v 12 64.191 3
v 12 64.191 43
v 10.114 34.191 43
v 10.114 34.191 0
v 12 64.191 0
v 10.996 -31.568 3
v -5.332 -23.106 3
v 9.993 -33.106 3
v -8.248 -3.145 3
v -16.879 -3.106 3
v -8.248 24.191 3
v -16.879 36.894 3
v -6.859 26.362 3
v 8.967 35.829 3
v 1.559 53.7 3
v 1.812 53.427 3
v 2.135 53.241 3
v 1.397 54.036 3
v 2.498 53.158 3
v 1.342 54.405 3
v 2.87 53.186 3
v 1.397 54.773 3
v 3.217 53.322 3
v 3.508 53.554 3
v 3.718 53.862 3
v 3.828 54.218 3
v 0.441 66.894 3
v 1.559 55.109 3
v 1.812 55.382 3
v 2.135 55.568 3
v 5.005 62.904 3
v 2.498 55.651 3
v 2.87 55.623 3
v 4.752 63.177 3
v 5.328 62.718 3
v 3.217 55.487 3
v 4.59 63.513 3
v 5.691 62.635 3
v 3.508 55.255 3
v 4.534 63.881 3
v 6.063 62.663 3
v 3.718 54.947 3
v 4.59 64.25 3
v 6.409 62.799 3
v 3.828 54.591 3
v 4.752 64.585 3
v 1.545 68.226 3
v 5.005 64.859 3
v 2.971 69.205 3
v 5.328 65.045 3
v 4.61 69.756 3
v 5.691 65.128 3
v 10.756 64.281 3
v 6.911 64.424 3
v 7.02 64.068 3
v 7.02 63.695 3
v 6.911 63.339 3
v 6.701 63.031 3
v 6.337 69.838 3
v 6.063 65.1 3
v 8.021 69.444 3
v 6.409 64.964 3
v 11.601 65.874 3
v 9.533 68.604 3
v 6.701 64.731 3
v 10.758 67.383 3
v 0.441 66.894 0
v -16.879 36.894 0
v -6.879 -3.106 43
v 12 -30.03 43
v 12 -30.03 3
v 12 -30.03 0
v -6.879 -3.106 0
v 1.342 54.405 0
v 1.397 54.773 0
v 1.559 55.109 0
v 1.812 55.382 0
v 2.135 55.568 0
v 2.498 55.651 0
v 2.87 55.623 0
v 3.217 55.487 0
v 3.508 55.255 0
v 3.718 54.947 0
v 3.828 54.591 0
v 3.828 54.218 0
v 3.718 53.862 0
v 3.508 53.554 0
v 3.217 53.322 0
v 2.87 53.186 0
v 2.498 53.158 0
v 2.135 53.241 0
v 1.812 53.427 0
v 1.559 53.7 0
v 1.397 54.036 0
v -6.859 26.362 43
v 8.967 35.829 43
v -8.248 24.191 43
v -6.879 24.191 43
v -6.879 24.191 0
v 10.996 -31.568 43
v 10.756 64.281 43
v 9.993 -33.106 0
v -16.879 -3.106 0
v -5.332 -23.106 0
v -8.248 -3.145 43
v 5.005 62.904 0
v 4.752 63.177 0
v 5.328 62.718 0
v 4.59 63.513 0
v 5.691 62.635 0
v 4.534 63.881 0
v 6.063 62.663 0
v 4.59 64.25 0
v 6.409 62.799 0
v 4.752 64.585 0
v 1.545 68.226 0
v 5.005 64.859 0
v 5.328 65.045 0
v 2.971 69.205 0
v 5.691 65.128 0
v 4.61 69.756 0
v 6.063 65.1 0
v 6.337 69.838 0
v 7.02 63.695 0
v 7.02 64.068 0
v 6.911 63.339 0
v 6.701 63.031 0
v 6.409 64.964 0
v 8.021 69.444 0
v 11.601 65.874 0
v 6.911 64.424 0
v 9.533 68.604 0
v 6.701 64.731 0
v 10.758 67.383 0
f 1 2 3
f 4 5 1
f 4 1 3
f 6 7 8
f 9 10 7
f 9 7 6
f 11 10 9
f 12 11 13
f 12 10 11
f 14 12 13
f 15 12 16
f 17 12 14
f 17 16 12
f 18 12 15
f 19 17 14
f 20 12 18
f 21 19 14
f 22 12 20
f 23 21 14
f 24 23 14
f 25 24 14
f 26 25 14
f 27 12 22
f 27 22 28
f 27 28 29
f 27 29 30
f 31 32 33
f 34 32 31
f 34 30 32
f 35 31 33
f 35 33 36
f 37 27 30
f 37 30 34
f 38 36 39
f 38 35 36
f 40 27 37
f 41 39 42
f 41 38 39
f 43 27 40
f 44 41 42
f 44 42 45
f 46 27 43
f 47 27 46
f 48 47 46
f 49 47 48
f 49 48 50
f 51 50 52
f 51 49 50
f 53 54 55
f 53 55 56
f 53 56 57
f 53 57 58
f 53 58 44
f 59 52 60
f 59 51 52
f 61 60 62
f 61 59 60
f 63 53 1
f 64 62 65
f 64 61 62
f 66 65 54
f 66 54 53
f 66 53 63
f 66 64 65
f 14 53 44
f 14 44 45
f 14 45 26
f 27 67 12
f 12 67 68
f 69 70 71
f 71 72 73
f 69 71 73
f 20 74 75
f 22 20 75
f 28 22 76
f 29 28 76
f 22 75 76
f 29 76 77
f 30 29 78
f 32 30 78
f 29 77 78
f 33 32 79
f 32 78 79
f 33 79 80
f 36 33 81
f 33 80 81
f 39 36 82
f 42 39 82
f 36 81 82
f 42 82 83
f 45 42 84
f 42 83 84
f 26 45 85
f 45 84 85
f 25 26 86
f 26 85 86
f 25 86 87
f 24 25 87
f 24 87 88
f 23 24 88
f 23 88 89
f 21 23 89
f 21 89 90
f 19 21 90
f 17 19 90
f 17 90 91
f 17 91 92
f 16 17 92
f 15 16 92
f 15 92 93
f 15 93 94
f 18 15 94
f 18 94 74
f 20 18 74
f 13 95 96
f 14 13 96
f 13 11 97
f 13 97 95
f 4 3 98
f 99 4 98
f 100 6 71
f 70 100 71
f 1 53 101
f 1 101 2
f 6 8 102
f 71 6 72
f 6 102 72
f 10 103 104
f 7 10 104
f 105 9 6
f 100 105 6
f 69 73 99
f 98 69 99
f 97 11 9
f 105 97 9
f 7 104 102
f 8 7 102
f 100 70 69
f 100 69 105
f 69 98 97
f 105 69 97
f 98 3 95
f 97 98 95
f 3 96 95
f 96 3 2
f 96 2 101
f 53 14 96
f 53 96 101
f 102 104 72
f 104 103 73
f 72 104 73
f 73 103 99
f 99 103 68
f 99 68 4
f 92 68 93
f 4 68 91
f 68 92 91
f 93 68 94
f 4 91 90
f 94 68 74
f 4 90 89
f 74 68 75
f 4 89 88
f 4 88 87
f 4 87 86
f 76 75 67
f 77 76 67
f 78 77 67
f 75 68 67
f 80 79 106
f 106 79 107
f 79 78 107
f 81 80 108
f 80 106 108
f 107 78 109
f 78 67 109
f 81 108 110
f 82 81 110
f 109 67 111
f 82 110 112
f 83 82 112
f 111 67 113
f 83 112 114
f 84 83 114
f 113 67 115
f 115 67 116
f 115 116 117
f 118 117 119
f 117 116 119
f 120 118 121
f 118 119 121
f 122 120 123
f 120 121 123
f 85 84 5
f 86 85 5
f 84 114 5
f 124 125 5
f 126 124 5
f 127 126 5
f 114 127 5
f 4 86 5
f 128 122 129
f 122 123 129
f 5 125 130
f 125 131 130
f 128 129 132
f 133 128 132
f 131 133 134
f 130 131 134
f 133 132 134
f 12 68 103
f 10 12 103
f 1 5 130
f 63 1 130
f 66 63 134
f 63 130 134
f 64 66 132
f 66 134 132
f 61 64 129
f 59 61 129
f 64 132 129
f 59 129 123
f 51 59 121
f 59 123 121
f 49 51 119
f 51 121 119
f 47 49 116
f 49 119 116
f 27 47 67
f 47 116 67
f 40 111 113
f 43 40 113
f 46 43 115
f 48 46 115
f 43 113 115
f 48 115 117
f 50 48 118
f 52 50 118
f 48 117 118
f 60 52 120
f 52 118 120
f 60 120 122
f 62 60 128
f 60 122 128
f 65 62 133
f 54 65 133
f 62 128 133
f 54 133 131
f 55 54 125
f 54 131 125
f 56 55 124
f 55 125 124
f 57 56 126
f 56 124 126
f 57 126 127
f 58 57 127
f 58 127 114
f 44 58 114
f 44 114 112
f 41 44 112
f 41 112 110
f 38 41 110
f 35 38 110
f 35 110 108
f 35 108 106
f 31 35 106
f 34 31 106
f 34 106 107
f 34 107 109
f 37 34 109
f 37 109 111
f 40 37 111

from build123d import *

# Parameters (mm, degrees)
EXTRUDE_4_DEPTH     = 3
EXTRUDE_6_DEPTH     = 43
EXTRUDE_7_DEPTH     = 40
EXTRUDE_8_DEPTH     = 40
SKETCH_14_R         = 1.25
CUT_EXTRUDE_3_DEPTH = 10


with BuildPart() as part:
    # 草图1 → 凸台-拉伸4 (new body)
    with BuildSketch(Plane.XY):
        with BuildLine():
            ThreePointArc((11.999755772, 64.190702015), (7.19287537, 69.699227744), (0.441332655, 66.894477154))
            Line((0.441332655, 66.894477154), (-16.87917542, 36.894477154))
            Line((-16.87917542, 36.894477154), (-16.87917542, -3.105522846))
            Line((-16.87917542, -3.105522846), (-5.332170037, -23.105522846))
            Line((-5.332170037, -23.105522846), (9.992741519, -33.105522846))
            Line((9.992741519, -33.105522846), (11.999755772, -30.029791253))
            Line((11.999755772, -30.029791253), (-6.87917542, -3.105522846))
            Line((-6.87917542, -3.105522846), (-6.87917542, 14.190702015))
            Line((-6.87917542, 14.190702015), (-6.87917542, 24.190702015))
            Line((-6.87917542, 24.190702015), (10.114332844, 34.190702015))
            Line((10.114332844, 34.190702015), (11.999755772, 64.190702015))
        make_face()
    extrude(amount=EXTRUDE_4_DEPTH)

    # 草图6 → 凸台-拉伸6 (add)
    with BuildSketch(Plane(origin=(0, 0, 0), x_dir=(-1, 0, 0), z_dir=(0, 0, -1))):
        Polygon((6.87917542, 24.190702015), (8.248400541, 24.190702015), (8.248400541, -3.145484966), (-10.996248645, -31.567657049), (-11.999755772, -30.029791253), (6.87917542, -3.105522846), align=None)
    extrude(amount=-EXTRUDE_6_DEPTH)

    # 草图9 → 凸台-拉伸7 (add)
    with BuildSketch(Plane.XY.offset(3)):
        Polygon((-8.248400541, 24.190702015), (-6.858844556, 26.362086453), (8.966526684, 35.828548473), (10.114332844, 34.190702015), (-6.87917542, 24.190702015), align=None)
    extrude(amount=EXTRUDE_7_DEPTH)

    # 草图11 → 凸台-拉伸8 (add)
    with BuildSketch(Plane.XY.offset(3)):
        Polygon((8.966526684, 35.828548473), (10.756094136, 64.281113509), (11.999755772, 64.190702015), (10.114332844, 34.190702015), align=None)
    extrude(amount=EXTRUDE_8_DEPTH)

    # 草图14 → 切除-拉伸3 (cut)
    with BuildSketch(Plane(origin=(0, 0, 0), x_dir=(-1, 0, 0), z_dir=(0, 0, -1))):
        with Locations((-2.591697764, 54.404600603)):
            Circle(SKETCH_14_R)
        with Locations((-5.784422652, 63.881230161)):
            Circle(SKETCH_14_R)
    extrude(amount=-CUT_EXTRUDE_3_DEPTH, mode=Mode.SUBTRACT)


solid = part.part
